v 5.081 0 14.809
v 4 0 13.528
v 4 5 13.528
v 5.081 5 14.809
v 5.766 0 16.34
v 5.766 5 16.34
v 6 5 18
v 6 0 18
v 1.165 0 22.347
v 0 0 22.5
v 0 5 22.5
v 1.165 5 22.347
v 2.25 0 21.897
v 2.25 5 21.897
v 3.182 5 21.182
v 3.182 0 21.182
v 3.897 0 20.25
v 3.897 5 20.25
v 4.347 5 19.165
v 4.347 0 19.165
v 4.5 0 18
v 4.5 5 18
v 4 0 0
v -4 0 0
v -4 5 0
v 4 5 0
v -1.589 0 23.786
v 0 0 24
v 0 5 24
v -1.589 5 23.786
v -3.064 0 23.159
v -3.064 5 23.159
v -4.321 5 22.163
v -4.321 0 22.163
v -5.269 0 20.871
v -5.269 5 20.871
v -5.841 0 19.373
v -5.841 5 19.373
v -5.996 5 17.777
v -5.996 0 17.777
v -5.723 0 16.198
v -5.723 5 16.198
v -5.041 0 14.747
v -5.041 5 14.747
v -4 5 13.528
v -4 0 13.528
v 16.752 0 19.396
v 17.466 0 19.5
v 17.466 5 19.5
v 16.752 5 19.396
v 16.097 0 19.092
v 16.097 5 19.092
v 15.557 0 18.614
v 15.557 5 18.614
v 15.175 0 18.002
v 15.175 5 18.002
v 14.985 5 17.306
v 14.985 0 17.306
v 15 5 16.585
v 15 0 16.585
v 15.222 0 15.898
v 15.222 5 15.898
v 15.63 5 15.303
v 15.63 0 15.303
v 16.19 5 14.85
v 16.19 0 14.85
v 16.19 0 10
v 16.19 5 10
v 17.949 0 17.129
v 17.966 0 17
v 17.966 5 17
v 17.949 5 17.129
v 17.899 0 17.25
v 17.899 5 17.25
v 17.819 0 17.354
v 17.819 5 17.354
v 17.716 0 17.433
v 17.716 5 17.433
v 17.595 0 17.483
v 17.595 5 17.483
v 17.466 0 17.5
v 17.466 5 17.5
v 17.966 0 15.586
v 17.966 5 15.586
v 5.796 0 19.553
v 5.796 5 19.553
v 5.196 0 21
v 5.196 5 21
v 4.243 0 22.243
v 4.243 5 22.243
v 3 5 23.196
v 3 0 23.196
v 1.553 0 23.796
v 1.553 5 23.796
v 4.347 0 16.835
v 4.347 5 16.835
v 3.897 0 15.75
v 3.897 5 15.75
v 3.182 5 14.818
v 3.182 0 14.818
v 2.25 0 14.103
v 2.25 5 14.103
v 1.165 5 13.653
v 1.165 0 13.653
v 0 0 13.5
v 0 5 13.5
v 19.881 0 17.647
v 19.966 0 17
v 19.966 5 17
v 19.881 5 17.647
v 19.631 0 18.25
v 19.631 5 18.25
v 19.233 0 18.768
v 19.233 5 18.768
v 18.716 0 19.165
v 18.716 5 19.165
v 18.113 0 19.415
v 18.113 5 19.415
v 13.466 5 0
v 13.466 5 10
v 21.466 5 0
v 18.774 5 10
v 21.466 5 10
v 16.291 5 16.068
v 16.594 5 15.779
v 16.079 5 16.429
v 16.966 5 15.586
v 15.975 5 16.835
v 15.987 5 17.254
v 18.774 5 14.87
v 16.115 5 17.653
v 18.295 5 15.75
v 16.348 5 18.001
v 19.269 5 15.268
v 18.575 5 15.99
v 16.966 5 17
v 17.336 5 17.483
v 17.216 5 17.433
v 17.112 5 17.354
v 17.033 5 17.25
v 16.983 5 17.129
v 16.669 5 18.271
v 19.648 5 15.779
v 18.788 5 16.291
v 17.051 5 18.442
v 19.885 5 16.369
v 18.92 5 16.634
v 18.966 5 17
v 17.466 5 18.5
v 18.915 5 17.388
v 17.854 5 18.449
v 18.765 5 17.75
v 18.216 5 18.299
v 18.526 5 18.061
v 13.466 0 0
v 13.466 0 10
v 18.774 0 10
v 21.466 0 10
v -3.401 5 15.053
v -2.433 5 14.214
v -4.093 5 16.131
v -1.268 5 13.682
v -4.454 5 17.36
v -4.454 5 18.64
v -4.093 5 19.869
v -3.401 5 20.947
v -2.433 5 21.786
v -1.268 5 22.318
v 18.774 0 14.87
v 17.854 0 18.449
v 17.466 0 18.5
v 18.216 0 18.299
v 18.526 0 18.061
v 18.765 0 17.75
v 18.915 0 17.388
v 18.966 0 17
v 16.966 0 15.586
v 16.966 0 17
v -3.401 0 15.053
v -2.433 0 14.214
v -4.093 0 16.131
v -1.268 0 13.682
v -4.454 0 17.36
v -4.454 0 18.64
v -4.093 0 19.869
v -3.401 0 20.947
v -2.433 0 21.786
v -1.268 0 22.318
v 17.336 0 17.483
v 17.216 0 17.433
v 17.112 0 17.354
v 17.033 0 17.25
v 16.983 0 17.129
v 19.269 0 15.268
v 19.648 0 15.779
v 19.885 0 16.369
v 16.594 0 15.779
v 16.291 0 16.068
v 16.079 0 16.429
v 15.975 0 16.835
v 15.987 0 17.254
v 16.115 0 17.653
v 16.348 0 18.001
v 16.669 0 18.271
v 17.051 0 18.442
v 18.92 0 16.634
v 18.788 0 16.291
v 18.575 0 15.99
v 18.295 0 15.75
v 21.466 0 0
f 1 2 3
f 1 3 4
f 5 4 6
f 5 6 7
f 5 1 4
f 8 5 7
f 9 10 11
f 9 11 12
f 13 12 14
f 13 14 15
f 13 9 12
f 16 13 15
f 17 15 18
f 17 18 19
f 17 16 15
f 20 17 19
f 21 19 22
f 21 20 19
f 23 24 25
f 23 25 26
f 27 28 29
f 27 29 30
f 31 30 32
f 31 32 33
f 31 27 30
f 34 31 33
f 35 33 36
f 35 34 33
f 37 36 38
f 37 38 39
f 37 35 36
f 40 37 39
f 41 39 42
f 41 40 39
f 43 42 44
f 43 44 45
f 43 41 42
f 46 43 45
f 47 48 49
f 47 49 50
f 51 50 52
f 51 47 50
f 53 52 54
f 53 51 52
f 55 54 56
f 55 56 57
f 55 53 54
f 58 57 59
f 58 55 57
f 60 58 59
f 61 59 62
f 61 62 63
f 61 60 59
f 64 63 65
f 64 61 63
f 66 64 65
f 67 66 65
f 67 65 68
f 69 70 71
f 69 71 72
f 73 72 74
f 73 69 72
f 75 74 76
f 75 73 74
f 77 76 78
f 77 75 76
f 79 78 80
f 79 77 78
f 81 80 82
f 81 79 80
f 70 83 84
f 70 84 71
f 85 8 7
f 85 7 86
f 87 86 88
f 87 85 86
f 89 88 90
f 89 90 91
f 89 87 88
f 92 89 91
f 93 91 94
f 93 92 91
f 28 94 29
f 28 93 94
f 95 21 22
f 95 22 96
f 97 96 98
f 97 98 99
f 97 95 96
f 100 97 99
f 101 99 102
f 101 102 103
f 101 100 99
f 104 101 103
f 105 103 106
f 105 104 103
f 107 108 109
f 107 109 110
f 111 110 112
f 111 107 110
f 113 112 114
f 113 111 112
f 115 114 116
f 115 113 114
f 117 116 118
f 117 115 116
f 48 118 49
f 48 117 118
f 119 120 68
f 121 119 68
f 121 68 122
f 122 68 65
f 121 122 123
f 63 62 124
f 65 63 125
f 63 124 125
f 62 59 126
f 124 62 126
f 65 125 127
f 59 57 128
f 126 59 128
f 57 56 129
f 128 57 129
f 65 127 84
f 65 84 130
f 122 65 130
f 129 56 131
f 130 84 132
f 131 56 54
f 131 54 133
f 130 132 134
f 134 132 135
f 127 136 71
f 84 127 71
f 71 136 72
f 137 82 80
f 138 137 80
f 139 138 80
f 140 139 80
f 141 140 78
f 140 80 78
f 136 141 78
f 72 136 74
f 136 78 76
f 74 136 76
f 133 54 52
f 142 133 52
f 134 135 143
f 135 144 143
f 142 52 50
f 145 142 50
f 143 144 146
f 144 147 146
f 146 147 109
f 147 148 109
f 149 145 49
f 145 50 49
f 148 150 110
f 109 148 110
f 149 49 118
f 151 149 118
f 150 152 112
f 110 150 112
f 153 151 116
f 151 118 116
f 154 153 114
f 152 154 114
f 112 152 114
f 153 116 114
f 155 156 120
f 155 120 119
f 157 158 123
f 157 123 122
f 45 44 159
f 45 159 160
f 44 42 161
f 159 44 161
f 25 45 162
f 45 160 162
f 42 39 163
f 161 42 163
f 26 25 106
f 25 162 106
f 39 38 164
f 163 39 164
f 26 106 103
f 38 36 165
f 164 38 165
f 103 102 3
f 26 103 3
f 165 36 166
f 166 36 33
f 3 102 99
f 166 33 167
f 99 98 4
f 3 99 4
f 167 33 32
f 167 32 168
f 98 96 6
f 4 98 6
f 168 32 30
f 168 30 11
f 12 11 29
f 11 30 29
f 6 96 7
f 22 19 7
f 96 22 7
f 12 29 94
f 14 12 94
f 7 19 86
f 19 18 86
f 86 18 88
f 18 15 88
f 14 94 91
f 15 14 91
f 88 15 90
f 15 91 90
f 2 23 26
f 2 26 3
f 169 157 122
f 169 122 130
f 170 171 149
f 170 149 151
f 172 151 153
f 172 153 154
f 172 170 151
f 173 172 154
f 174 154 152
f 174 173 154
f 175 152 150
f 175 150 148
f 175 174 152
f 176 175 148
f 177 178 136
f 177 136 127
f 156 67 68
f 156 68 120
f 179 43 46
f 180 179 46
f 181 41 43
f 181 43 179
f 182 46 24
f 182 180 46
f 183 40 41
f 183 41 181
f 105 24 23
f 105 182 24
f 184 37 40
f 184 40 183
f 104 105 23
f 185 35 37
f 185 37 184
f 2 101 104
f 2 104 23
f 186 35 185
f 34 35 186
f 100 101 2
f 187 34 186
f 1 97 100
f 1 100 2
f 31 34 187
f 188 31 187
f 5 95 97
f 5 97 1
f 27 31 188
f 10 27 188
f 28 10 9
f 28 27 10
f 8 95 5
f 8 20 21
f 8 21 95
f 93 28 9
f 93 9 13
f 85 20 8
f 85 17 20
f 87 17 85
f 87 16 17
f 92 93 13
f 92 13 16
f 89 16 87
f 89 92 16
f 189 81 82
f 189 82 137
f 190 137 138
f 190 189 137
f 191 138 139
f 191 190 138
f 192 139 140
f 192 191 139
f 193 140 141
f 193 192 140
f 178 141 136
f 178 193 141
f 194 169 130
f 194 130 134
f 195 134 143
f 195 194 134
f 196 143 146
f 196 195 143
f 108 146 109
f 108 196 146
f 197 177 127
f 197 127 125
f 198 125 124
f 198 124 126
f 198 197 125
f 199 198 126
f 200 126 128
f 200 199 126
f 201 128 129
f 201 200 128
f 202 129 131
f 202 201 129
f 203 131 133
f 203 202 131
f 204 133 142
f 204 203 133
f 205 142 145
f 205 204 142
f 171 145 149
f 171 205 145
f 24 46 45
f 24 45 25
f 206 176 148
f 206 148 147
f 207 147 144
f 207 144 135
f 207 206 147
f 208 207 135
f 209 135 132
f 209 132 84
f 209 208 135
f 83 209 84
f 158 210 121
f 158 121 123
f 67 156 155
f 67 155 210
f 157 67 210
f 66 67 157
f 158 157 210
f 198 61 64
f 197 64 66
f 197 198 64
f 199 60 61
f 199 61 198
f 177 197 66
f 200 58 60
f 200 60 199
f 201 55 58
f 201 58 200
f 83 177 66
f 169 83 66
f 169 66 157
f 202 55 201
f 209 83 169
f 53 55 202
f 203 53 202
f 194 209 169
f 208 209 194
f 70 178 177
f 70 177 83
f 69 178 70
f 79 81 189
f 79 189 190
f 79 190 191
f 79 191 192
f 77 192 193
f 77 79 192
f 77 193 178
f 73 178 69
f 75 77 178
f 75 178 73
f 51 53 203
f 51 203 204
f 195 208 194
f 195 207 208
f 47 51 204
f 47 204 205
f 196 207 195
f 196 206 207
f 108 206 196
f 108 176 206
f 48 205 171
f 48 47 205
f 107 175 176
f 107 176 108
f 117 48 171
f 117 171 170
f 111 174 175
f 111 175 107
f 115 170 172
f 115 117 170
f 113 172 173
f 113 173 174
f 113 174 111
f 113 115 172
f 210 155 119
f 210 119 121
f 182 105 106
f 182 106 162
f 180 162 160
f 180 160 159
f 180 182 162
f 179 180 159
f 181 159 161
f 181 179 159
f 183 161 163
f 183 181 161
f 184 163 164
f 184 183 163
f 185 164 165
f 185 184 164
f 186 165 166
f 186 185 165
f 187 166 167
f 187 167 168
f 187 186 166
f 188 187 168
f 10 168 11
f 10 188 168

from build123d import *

# Parameters (mm, degrees)
F0_W     = 4
F0_H     = 12
F1_DEPTH = 5
F3_DEPTH = 5


with BuildPart() as f1:
    # F0 (on Front) → F1 (new body)
    with BuildSketch(Plane.XZ):
        with Locations((-2, 6)):
            Rectangle(F0_W, F0_H)
        with Locations((2, 6)):
            Rectangle(F0_W, F0_H)
        with BuildLine():
            ThreePointArc((4, 13.527864), (2.140933, 12.394966), (0, 12))
            Line((0, 12), (4, 12))
            Line((4, 12), (4, 13.527864))
        make_face()
        with BuildLine():
            ThreePointArc((-4, 13.527864), (-2.140933, 12.394966), (0, 12))
            Line((0, 12), (0, 13.5))
            ThreePointArc((0, 13.5), (-4.5, 18), (0, 22.5))
            Line((0, 22.5), (0, 24))
            ThreePointArc((0, 24), (-5.605034, 20.140933), (-4, 13.527864))
        make_face()
        with BuildLine():
            Line((-4, 12), (0, 12))
            ThreePointArc((0, 12), (-2.140933, 12.394966), (-4, 13.527864))
            Line((-4, 13.527864), (-4, 12))
        make_face()
        with BuildLine():
            Line((0, 13.5), (0, 12))
            ThreePointArc((0, 12), (2.140933, 12.394966), (4, 13.527864))
            ThreePointArc((4, 13.527864), (5.477226, 15.55051), (6, 18))
            ThreePointArc((6, 18), (4.242641, 22.242641), (0, 24))
            Line((0, 24), (0, 22.5))
            ThreePointArc((0, 22.5), (3.181981, 21.181981), (4.5, 18))
            ThreePointArc((4.5, 18), (3.181981, 14.818019), (0, 13.5))
        make_face()
    extrude(amount=-F1_DEPTH)


with BuildPart() as f3:
    # F2 (on Front) → F3 (new body)
    with BuildSketch(Plane.XZ):
        with BuildLine():
            Line((17.465726, 16.5), (17.465726, 15.5))
            ThreePointArc((17.465726, 15.5), (17.719379, 15.521602), (17.965726, 15.585786))
            Line((17.965726, 15.585786), (17.965726, 16.5))
            Line((17.965726, 16.5), (17.465726, 16.5))
        make_face()
        with BuildLine():
            ThreePointArc((16.965726, 15.585786), (17.212073, 15.521602), (17.465726, 15.5))
            Line((17.465726, 15.5), (17.465726, 16.5))
            Line((17.465726, 16.5), (16.965726, 16.5))
            Line((16.965726, 16.5), (16.965726, 15.585786))
        make_face()
        with BuildLine():
            Line((16.965726, 15.5), (17.465726, 15.5))
            ThreePointArc((17.465726, 15.5), (17.212073, 15.521602), (16.965726, 15.585786))
            Line((16.965726, 15.585786), (16.965726, 15.5))
        make_face()
        with BuildLine():
            ThreePointArc((17.965726, 15.585786), (17.719379, 15.521602), (17.465726, 15.5))
            Line((17.465726, 15.5), (17.965726, 15.5))
            Line((17.965726, 15.5), (17.965726, 15.585786))
        make_face()
        with BuildLine():
            ThreePointArc((17.965726, 17), (17.819279, 16.646447), (17.465726, 16.5))
            Line((17.465726, 16.5), (17.965726, 16.5))
            Line((17.965726, 16.5), (17.965726, 17))
        make_face()
        with BuildLine():
            ThreePointArc((17.965726, 17), (17.819279, 17.353553), (17.465726, 17.5))
            Line((17.465726, 17.5), (17.465726, 16.5))
            ThreePointArc((17.465726, 16.5), (17.819279, 16.646447), (17.965726, 17))
        make_face()
        with BuildLine():
            Line((17.465726, 16.5), (17.465726, 17.5))
            ThreePointArc((17.465726, 17.5), (17.112172, 17.353553), (16.965726, 17))
            ThreePointArc((16.965726, 17), (17.112172, 16.646447), (17.465726, 16.5))
        make_face()
        with BuildLine():
            Line((16.965726, 16.5), (17.465726, 16.5))
            ThreePointArc((17.465726, 16.5), (17.112172, 16.646447), (16.965726, 17))
            Line((16.965726, 17), (16.965726, 16.5))
        make_face()
        with BuildLine():
            ThreePointArc((17.465726, 19.5), (15.054735, 17.661152), (16.1905, 14.849698))
            Line((16.1905, 14.849698), (17.465726, 14.849698))
            Line((17.465726, 14.849698), (17.465726, 14.869544))
            Line((17.465726, 14.869544), (17.465726, 15.5))
            Line((17.465726, 15.5), (16.965726, 15.5))
            Line((16.965726, 15.5), (16.965726, 15.585786))
            ThreePointArc((16.965726, 15.585786), (15.987328, 17.253653), (17.465726, 18.5))
            Line((17.465726, 18.5), (17.465726, 19.5))
        make_face()
        with BuildLine():
            Line((17.465726, 14.869544), (18.773838, 14.869544))
            ThreePointArc((18.773838, 14.869544), (19.6475, 15.779402), (19.965726, 17))
            ThreePointArc((19.965726, 17), (19.233493, 18.767767), (17.465726, 19.5))
            Line((17.465726, 19.5), (17.465726, 18.5))
            ThreePointArc((17.465726, 18.5), (18.526386, 18.06066), (18.965726, 17))
            ThreePointArc((18.965726, 17), (18.690471, 16.133975), (17.965726, 15.585786))
            Line((17.965726, 15.585786), (17.965726, 15.5))
            Line((17.965726, 15.5), (17.465726, 15.5))
            Line((17.465726, 15.5), (17.465726, 14.869544))
        make_face()
        with BuildLine():
            ThreePointArc((17.465726, 14.5), (18.14538, 14.594159), (18.773838, 14.869544))
            Line((18.773838, 14.869544), (17.465726, 14.869544))
            Line((17.465726, 14.869544), (17.465726, 14.849698))
            Line((17.465726, 14.849698), (17.465726, 14.5))
        make_face()
        with BuildLine():
            Line((17.465726, 14.849698), (16.1905, 14.849698))
            ThreePointArc((16.1905, 14.849698), (16.804573, 14.589009), (17.465726, 14.5))
            Line((17.465726, 14.5), (17.465726, 14.849698))
        make_face()
        with BuildLine():
            Line((18.465726, 10), (18.773838, 10))
            Line((18.773838, 10), (18.773838, 14.869544))
            ThreePointArc((18.773838, 14.869544), (18.14538, 14.594159), (17.465726, 14.5))
            Line((17.465726, 14.5), (17.465726, 10))
            Line((17.465726, 10), (18.465726, 10))
        make_face()
        with BuildLine():
            Line((16.1905, 14.849698), (16.1905, 10))
            Line((16.1905, 10), (16.465726, 10))
            Line((16.465726, 10), (17.465726, 10))
            Line((17.465726, 10), (17.465726, 14.5))
            ThreePointArc((17.465726, 14.5), (16.804573, 14.589009), (16.1905, 14.849698))
        make_face()
        Polygon((13.465726, 10), (13.465726, 0), (21.465726, 0), (21.465726, 10), (18.773838, 10), (18.465726, 10), (17.465726, 10), (16.465726, 10), (16.1905, 10), align=None)
    extrude(amount=-F3_DEPTH)


solid = Compound([f1.part, f3.part])
